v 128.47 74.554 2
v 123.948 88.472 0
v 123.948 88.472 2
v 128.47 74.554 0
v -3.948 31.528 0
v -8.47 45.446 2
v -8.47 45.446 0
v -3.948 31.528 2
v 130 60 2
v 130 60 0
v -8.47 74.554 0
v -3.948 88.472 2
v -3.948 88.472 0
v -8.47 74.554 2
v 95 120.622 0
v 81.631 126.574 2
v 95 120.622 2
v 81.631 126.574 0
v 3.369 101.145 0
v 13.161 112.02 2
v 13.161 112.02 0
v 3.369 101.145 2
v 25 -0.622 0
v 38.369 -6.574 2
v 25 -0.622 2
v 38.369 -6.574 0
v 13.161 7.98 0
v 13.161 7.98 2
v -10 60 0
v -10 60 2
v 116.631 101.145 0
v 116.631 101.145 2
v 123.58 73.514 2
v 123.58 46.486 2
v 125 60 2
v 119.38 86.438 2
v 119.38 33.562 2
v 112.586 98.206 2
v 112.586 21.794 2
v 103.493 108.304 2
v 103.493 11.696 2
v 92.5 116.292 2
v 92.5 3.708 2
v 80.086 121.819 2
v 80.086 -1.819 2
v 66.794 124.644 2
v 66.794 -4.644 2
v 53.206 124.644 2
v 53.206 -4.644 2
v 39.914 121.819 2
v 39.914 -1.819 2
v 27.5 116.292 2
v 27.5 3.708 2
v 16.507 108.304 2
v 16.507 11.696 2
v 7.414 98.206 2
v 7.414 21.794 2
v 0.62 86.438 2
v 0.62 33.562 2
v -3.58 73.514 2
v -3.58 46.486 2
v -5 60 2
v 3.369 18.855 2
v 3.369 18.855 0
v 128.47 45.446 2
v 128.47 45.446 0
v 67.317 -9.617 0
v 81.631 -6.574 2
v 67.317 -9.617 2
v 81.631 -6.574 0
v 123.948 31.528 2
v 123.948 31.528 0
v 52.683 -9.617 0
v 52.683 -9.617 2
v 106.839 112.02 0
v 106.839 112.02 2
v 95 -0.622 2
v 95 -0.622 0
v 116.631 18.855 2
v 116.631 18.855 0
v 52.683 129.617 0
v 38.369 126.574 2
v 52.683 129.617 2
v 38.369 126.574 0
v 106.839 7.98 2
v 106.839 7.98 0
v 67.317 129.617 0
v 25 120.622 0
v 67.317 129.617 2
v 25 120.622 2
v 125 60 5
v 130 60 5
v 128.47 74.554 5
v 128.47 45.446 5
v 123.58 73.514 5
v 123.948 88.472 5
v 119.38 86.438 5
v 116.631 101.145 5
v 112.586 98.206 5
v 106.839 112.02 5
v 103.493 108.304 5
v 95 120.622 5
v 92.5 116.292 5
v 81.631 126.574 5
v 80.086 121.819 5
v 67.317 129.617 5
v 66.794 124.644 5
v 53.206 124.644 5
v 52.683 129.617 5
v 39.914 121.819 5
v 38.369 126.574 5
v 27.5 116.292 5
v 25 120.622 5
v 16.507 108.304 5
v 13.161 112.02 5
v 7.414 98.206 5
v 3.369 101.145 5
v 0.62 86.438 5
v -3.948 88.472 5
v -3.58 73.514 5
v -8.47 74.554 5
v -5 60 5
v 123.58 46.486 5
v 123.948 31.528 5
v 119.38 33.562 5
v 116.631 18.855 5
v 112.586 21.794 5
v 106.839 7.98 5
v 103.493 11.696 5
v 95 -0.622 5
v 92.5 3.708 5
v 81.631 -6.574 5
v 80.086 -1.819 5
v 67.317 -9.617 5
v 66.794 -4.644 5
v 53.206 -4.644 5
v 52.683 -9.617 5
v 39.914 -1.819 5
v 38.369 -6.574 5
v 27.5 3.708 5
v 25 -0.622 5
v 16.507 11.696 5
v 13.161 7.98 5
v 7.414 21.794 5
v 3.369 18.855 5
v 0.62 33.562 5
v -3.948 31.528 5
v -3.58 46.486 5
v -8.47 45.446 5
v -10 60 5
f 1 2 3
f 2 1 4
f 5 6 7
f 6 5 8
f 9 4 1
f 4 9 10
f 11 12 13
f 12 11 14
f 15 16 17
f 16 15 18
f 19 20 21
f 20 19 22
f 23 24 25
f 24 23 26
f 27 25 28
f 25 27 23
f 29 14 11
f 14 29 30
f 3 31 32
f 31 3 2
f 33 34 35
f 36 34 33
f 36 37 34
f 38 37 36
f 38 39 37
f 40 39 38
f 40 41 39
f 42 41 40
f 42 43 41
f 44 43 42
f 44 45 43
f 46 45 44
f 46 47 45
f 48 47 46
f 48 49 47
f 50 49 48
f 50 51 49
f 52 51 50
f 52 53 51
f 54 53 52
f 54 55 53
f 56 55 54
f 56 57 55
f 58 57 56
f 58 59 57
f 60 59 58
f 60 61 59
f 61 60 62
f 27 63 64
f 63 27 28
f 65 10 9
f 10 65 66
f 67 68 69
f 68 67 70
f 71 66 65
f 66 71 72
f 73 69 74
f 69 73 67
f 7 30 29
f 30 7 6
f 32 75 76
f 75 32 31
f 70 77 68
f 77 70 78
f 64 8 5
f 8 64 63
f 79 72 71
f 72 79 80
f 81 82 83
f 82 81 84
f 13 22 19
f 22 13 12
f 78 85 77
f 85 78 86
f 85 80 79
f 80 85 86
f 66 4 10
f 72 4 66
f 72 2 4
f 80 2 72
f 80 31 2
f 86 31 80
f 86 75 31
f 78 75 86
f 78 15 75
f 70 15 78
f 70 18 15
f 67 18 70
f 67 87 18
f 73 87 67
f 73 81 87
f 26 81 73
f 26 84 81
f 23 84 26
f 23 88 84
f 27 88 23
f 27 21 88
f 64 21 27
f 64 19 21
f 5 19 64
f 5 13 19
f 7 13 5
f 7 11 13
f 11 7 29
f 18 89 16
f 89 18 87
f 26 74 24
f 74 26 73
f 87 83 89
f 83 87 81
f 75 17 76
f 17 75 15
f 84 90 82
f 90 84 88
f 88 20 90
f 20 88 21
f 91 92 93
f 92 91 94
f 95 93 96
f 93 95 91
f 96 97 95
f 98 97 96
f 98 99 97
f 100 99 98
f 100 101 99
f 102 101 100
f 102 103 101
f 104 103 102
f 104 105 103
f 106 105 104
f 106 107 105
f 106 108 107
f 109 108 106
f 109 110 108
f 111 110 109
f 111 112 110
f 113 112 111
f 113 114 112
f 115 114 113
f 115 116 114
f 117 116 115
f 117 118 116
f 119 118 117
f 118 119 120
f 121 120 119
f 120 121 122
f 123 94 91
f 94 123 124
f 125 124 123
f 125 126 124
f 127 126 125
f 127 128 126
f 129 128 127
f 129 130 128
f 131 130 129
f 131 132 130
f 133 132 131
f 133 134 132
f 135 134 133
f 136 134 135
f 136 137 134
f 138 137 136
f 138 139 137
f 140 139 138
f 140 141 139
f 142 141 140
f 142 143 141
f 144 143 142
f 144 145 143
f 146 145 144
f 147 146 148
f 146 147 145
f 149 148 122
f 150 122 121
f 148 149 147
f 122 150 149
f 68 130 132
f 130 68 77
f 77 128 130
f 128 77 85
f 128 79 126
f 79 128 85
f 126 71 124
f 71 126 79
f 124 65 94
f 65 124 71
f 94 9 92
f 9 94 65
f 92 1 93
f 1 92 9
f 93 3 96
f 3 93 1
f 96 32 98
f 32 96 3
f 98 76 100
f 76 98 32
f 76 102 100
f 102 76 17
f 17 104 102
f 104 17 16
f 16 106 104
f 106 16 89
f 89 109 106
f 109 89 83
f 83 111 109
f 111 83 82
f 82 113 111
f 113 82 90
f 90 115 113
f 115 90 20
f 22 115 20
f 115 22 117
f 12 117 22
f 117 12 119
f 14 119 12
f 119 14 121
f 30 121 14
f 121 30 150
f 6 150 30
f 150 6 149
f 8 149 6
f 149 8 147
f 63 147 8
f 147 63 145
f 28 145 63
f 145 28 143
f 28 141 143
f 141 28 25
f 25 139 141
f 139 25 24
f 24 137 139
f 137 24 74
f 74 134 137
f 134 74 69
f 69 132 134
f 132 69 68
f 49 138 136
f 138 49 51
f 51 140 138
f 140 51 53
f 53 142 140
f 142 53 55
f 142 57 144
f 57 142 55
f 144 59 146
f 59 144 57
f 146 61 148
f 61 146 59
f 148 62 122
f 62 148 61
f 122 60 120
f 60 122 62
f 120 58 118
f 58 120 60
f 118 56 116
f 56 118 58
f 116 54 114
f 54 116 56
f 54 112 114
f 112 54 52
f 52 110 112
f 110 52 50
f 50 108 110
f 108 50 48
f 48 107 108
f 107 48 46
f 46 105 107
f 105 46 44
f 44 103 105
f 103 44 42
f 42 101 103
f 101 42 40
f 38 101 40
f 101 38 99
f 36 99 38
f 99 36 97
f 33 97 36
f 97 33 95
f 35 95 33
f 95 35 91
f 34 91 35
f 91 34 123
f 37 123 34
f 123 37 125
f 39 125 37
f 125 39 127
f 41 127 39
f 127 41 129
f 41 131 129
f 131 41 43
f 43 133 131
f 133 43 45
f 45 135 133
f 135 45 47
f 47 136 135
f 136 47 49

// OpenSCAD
/* 
MIDCITY COASTER
Over the past couple of years, I've gotten to know the folks at Midcity cafe after being introduced by my coworker, who used to work there.  
It seemed like a fun and easy way for me to learn how to use Inkscape to create a DXF file from a simple image that can be used by OpenScad to create an STL. 
I will then input the STL into Flashpoint to create gcode so that the result can be printed on my Flashforge Creator Pro!
*/
union(){
union(){
//Reads the DXF file and creates a 2D shape.
translate([0,10,0])
linear_extrude(height = 5) import("midcity.dxf");
color("black",1)
//creates backing
linear_extrude(height = 2)
   translate([60,60,0]) 
circle(70);
}
translate([60,60,0])
linear_extrude(height=5){   
 {difference(){circle(70);circle(65);}}
;
}}
